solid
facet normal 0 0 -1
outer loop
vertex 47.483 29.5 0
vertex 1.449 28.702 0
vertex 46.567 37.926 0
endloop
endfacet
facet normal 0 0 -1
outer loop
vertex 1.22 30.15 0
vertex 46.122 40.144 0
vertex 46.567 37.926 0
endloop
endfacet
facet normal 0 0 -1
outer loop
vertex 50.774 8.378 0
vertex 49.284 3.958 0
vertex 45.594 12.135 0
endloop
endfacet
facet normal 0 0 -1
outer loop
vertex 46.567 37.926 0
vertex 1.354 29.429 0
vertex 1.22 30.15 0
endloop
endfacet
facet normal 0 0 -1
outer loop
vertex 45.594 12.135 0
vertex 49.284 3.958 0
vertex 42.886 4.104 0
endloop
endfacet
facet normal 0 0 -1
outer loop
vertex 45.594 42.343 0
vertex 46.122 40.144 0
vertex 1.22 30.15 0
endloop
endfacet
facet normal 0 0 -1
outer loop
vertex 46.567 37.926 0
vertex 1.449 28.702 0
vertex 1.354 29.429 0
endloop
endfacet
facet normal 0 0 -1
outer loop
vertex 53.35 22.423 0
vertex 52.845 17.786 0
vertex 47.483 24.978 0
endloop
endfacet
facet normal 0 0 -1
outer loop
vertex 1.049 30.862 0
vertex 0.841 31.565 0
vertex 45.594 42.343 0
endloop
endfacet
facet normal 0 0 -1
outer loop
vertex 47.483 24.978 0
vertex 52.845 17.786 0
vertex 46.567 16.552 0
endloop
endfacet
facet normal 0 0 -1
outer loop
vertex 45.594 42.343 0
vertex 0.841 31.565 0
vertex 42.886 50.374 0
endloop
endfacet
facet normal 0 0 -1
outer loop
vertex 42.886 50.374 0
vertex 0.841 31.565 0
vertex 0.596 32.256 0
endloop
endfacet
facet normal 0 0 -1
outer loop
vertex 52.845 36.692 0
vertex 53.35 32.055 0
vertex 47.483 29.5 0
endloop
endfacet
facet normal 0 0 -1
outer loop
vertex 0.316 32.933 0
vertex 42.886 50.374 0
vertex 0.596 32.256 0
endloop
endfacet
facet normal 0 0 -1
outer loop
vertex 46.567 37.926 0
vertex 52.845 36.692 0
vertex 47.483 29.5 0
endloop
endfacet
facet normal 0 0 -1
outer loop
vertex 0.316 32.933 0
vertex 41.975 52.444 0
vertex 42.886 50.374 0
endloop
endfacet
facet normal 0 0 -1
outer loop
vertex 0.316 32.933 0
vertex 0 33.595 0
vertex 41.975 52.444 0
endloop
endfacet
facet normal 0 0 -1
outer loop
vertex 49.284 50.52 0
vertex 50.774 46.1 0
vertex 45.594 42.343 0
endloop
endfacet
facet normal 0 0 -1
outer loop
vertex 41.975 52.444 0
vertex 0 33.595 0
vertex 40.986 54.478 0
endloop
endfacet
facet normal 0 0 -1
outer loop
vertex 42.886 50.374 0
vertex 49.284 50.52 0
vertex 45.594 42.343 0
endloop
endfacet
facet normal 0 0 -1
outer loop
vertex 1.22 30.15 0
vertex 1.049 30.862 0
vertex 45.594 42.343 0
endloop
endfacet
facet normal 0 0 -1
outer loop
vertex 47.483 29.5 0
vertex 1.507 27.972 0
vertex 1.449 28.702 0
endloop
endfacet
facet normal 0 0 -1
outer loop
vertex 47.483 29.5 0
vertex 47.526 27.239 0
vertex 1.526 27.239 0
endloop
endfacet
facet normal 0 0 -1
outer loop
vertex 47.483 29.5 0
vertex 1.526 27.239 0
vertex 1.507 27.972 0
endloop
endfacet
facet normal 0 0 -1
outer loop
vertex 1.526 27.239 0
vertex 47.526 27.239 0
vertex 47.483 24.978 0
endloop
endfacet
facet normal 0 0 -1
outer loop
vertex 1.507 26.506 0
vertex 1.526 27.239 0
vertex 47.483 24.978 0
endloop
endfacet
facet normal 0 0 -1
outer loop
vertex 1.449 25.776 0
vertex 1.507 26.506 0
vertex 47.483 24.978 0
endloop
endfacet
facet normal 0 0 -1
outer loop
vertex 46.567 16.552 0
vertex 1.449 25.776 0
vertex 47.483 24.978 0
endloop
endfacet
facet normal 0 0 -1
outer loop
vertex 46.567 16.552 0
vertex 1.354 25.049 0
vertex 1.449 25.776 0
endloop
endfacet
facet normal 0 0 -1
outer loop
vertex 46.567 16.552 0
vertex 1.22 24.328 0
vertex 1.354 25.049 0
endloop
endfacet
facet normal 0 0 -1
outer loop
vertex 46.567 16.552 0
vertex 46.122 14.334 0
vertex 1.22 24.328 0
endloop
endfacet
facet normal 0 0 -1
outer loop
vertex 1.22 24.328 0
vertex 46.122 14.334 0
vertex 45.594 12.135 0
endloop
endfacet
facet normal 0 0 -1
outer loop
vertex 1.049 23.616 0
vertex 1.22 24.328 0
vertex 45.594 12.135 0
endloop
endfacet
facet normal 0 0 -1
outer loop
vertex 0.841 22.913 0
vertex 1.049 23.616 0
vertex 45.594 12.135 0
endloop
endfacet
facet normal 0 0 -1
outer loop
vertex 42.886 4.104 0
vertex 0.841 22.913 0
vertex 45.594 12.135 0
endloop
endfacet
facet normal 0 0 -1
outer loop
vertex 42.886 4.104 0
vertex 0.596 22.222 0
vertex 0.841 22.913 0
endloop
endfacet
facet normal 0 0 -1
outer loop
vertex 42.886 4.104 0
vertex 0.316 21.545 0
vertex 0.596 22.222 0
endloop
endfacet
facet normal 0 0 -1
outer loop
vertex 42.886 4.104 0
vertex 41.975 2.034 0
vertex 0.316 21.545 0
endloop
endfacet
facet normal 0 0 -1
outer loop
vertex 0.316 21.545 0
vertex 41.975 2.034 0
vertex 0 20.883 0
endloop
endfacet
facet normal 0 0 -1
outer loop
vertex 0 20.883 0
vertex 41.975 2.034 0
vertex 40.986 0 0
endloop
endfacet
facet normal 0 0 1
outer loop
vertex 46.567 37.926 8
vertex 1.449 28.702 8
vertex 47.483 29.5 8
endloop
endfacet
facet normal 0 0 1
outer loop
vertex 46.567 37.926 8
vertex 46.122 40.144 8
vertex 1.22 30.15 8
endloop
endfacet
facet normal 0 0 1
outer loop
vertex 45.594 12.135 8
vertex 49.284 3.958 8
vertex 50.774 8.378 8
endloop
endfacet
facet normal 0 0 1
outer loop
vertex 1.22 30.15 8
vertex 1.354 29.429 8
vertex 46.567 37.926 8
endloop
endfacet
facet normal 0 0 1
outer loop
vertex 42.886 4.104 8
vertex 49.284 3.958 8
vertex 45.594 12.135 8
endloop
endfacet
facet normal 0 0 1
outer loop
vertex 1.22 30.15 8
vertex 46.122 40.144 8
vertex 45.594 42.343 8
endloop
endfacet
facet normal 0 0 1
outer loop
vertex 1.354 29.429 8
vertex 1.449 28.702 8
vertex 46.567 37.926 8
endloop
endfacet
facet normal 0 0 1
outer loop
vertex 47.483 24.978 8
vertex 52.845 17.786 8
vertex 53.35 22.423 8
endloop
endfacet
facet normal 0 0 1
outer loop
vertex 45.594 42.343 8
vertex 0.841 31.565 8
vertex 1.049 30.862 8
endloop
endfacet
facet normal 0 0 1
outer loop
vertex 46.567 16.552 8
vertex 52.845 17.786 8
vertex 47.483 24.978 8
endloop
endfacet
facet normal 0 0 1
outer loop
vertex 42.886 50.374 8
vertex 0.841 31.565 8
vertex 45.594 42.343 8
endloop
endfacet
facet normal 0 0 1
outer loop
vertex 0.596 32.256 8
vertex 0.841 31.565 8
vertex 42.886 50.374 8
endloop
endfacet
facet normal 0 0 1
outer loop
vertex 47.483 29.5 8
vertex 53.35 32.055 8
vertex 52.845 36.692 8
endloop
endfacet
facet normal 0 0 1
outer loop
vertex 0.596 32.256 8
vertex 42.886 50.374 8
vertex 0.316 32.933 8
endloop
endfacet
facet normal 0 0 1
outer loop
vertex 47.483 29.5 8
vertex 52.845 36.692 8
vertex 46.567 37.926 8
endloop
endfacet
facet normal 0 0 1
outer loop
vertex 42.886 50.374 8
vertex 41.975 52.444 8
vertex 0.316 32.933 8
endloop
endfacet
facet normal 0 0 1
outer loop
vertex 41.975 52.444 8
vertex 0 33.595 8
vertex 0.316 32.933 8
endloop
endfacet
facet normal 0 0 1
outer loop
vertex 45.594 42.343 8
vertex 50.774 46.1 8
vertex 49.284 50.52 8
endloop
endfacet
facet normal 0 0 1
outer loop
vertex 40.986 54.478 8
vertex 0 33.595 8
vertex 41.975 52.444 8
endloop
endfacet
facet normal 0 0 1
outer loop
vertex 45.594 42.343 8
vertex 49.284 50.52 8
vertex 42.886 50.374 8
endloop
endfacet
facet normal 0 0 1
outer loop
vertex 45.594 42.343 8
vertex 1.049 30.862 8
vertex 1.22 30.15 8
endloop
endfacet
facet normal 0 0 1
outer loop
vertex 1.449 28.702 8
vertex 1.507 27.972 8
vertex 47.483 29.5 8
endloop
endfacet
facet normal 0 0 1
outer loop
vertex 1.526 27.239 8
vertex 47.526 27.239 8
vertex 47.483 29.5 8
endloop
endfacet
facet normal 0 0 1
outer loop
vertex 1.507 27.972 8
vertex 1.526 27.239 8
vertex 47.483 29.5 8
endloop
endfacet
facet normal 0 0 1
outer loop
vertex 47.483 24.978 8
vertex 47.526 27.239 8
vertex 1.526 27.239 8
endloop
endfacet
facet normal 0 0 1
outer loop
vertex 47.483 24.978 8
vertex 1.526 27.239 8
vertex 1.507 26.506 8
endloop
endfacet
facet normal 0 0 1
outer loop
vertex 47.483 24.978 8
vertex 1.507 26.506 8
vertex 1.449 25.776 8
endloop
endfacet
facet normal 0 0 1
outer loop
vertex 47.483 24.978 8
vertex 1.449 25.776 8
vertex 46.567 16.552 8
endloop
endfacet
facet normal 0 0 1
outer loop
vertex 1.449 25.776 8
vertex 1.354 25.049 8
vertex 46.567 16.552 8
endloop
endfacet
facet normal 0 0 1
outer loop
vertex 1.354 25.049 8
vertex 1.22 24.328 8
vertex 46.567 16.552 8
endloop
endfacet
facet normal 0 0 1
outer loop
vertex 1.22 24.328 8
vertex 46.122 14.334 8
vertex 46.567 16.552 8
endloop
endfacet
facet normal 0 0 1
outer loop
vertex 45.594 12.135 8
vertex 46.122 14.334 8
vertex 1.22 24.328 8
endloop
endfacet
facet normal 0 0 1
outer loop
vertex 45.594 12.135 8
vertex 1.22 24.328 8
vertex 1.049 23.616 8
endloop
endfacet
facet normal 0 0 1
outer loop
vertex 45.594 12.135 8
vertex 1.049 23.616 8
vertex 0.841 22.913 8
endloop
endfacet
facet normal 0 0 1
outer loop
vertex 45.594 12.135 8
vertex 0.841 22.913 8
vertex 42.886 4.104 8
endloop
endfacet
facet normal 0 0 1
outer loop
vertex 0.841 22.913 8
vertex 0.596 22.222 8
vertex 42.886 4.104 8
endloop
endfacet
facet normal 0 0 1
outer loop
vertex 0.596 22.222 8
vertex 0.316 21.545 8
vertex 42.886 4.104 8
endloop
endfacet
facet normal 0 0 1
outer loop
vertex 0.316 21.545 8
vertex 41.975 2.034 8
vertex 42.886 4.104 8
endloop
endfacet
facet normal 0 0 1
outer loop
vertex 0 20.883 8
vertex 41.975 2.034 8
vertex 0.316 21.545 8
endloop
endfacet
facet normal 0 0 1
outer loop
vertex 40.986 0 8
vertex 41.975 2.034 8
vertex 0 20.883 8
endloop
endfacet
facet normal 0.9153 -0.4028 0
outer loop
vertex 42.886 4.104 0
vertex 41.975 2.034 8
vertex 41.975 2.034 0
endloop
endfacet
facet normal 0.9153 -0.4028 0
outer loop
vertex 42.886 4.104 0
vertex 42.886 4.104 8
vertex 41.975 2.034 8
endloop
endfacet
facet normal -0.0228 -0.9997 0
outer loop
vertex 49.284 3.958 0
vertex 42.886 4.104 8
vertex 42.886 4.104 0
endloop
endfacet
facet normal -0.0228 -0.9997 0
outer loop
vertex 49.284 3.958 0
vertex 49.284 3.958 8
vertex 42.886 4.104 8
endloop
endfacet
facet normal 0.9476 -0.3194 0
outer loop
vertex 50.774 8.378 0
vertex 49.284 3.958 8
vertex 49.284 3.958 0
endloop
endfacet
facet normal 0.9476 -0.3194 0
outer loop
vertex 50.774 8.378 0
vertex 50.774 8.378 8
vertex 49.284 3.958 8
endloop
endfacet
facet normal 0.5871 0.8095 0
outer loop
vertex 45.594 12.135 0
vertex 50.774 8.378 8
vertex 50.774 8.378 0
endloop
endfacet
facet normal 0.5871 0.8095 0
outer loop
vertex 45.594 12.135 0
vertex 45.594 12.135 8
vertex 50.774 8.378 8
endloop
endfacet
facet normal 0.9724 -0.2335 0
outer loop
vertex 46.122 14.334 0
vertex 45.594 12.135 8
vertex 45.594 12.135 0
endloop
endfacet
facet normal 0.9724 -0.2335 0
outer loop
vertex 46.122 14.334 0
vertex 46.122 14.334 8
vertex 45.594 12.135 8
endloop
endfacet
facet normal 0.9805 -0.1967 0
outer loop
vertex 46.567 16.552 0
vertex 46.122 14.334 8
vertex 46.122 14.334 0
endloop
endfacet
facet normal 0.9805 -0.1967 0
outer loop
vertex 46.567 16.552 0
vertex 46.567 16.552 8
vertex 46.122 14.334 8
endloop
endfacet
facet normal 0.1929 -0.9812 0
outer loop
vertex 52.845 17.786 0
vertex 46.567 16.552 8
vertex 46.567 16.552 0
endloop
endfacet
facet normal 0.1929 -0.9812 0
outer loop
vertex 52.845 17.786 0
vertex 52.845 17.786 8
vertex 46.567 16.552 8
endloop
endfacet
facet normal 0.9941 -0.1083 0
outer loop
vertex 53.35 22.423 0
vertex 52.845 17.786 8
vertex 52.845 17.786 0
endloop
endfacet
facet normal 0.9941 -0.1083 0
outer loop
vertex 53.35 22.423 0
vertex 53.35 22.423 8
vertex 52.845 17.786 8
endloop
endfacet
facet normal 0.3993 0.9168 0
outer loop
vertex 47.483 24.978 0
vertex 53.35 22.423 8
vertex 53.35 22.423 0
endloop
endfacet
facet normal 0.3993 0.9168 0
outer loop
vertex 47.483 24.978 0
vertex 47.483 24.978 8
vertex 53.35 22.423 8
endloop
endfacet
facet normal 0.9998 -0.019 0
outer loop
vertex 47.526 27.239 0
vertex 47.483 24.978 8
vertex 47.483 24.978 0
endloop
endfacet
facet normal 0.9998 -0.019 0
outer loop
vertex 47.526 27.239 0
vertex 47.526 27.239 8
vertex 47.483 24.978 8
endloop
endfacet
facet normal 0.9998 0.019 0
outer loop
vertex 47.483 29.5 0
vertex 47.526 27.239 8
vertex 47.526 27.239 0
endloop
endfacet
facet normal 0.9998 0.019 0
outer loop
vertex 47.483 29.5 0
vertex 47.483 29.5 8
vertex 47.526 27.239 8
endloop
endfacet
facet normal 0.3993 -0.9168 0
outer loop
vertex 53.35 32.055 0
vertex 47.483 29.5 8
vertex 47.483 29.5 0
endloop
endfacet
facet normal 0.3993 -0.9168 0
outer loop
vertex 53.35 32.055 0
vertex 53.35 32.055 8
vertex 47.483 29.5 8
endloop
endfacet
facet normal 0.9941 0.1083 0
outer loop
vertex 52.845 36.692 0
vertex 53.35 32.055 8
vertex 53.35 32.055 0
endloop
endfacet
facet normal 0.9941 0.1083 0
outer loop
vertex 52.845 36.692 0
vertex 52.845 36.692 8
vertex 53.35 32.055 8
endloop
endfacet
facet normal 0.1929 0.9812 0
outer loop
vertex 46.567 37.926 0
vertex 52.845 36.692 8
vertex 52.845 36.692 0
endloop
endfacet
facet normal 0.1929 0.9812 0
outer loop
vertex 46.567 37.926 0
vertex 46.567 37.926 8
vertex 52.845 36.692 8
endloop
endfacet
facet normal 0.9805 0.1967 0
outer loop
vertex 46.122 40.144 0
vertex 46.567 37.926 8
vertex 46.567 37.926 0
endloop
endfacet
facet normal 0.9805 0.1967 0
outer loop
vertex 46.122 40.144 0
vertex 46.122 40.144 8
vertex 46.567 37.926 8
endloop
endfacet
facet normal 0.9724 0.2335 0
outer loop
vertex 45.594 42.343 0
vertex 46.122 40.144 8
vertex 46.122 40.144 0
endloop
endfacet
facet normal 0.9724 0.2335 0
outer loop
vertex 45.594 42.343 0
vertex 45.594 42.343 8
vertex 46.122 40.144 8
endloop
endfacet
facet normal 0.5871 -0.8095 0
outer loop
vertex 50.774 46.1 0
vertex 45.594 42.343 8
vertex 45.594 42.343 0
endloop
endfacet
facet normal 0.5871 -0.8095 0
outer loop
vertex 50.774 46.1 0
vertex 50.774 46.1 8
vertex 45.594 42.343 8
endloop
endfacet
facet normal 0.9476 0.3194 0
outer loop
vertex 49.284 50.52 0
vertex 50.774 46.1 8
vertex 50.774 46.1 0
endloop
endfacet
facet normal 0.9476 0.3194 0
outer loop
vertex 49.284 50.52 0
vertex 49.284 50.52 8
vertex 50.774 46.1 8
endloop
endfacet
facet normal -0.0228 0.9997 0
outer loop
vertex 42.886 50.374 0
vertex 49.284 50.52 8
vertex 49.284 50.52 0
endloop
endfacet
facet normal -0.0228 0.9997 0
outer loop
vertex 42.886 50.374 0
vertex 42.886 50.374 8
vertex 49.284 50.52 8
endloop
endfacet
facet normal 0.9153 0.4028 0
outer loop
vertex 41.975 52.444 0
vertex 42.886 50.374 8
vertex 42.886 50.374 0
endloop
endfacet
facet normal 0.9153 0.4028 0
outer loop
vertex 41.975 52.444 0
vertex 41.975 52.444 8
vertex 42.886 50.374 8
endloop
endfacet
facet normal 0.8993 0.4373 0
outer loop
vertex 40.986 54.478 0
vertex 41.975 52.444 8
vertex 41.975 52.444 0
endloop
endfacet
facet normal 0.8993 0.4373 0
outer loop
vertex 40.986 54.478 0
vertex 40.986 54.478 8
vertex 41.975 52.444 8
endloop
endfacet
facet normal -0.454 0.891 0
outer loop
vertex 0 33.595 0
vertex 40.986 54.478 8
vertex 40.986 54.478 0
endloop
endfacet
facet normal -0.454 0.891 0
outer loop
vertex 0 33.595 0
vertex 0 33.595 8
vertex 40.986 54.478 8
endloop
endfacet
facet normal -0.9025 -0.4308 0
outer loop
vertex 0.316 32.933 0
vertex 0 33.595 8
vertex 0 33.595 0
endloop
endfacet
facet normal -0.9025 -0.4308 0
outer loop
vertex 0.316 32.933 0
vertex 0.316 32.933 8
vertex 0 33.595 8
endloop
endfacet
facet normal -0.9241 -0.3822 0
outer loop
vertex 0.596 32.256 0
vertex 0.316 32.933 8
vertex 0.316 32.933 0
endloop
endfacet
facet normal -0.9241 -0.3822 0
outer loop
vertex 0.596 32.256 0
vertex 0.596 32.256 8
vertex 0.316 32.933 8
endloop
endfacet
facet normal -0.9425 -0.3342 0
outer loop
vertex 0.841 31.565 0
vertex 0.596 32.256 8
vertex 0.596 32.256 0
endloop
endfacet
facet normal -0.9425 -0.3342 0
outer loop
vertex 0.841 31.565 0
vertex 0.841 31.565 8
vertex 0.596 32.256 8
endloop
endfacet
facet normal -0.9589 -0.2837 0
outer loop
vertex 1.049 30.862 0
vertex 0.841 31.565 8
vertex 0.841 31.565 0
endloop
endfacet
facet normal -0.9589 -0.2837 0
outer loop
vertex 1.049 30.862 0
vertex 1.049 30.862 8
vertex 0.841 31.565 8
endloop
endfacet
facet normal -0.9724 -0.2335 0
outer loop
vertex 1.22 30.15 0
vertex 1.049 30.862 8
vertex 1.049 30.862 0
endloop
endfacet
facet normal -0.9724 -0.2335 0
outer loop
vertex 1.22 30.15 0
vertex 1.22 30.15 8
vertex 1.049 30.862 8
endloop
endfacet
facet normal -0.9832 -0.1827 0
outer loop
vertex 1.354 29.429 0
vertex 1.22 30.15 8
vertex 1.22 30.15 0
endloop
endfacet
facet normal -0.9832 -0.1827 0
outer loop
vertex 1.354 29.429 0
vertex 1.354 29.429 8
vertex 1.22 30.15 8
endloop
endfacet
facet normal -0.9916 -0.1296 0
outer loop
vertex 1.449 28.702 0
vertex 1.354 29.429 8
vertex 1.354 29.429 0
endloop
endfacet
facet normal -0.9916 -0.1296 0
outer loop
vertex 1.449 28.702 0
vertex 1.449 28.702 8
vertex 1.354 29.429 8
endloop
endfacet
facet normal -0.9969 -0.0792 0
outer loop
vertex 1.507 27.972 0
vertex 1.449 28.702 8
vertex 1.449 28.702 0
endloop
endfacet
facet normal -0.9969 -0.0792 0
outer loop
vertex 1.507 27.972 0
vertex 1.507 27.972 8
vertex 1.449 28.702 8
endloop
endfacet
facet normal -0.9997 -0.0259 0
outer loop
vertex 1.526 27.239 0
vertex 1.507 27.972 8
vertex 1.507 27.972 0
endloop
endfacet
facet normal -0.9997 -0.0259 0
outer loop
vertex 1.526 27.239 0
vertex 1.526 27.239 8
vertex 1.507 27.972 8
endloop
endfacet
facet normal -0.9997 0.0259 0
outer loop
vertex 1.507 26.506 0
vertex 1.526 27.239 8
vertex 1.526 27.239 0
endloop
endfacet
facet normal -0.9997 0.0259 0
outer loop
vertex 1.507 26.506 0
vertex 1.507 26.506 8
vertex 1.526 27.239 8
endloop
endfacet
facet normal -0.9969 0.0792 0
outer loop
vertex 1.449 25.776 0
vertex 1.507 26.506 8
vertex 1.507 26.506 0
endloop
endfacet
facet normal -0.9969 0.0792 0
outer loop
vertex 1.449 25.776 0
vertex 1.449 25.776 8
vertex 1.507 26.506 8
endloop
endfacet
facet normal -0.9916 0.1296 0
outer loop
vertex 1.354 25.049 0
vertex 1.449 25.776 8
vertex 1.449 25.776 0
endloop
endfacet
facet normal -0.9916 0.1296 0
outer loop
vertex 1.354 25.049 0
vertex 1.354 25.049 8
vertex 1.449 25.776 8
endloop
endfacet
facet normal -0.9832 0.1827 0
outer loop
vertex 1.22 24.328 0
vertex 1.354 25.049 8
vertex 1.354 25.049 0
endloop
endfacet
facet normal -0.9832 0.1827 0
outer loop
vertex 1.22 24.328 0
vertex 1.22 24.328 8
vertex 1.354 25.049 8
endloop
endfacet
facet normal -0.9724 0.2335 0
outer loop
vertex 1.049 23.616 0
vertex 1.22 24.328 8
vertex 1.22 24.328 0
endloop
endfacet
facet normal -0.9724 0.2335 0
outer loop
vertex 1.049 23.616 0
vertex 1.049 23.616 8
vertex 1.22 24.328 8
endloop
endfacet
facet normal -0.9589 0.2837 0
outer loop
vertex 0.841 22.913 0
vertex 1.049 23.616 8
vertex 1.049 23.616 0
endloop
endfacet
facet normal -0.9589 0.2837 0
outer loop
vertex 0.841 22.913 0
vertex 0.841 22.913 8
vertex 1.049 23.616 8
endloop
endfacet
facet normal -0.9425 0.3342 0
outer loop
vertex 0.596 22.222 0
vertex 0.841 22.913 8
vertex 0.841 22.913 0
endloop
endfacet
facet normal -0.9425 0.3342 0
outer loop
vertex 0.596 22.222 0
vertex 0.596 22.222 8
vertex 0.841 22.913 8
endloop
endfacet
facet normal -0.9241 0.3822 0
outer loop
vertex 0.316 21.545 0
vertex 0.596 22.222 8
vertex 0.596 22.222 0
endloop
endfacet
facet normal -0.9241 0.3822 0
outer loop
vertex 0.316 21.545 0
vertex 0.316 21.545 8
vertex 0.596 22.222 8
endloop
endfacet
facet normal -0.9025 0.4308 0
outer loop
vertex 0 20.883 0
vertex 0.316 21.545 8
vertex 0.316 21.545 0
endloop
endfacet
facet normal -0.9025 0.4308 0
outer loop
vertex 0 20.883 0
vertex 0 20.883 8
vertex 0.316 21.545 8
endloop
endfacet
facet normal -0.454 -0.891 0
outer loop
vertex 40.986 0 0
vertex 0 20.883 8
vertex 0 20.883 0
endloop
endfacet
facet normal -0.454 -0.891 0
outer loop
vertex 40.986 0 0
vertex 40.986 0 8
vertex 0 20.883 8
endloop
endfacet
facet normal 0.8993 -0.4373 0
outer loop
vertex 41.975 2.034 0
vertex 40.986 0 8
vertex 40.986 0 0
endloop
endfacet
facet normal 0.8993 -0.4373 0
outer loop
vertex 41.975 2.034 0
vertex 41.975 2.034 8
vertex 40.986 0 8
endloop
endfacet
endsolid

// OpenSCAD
$fn = 32;

// ----------------------------------------------------------------------
// Gear sector: 4 teeth on 54 degrees
// ----------------------------------------------------------------------

// --- parameters (mm) ---
sector_angle = 54;        // sector angle, degrees
root_r = 60;              // root circle radius
tooth_h = 6;              // tooth height over the root circle
teeth = 4;                // number of teeth on the sector
hub_r = 14;               // hub bore radius
plate_t = 8;              // sector thickness, Z
arc_step = 3;             // sampling step of the root/hub arcs, degrees

tip_r = root_r + tooth_h;  // tip circle radius

profile = [[40.986, 0], [41.975, 2.034], [42.886, 4.104], [49.284, 3.958], [50.774, 8.378], [45.594, 12.135], [46.122, 14.334], [46.567, 16.552], [52.845, 17.786], [53.35, 22.423], [47.483, 24.978], [47.526, 27.239], [47.483, 29.5], [53.35, 32.055], [52.845, 36.692], [46.567, 37.926], [46.122, 40.144], [45.594, 42.343], [50.774, 46.1], [49.284, 50.52], [42.886, 50.374], [41.975, 52.444], [40.986, 54.478], [0, 33.595], [0.316, 32.933], [0.596, 32.256], [0.841, 31.565], [1.049, 30.862], [1.22, 30.15], [1.354, 29.429], [1.449, 28.702], [1.507, 27.972], [1.526, 27.239], [1.507, 26.506], [1.449, 25.776], [1.354, 25.049], [1.22, 24.328], [1.049, 23.616], [0.841, 22.913], [0.596, 22.222], [0.316, 21.545], [0, 20.883]];  // primary outline, 42 points, counter clockwise

// --- the one profile operation ---
linear_extrude(height = plate_t) polygon(points = profile);
